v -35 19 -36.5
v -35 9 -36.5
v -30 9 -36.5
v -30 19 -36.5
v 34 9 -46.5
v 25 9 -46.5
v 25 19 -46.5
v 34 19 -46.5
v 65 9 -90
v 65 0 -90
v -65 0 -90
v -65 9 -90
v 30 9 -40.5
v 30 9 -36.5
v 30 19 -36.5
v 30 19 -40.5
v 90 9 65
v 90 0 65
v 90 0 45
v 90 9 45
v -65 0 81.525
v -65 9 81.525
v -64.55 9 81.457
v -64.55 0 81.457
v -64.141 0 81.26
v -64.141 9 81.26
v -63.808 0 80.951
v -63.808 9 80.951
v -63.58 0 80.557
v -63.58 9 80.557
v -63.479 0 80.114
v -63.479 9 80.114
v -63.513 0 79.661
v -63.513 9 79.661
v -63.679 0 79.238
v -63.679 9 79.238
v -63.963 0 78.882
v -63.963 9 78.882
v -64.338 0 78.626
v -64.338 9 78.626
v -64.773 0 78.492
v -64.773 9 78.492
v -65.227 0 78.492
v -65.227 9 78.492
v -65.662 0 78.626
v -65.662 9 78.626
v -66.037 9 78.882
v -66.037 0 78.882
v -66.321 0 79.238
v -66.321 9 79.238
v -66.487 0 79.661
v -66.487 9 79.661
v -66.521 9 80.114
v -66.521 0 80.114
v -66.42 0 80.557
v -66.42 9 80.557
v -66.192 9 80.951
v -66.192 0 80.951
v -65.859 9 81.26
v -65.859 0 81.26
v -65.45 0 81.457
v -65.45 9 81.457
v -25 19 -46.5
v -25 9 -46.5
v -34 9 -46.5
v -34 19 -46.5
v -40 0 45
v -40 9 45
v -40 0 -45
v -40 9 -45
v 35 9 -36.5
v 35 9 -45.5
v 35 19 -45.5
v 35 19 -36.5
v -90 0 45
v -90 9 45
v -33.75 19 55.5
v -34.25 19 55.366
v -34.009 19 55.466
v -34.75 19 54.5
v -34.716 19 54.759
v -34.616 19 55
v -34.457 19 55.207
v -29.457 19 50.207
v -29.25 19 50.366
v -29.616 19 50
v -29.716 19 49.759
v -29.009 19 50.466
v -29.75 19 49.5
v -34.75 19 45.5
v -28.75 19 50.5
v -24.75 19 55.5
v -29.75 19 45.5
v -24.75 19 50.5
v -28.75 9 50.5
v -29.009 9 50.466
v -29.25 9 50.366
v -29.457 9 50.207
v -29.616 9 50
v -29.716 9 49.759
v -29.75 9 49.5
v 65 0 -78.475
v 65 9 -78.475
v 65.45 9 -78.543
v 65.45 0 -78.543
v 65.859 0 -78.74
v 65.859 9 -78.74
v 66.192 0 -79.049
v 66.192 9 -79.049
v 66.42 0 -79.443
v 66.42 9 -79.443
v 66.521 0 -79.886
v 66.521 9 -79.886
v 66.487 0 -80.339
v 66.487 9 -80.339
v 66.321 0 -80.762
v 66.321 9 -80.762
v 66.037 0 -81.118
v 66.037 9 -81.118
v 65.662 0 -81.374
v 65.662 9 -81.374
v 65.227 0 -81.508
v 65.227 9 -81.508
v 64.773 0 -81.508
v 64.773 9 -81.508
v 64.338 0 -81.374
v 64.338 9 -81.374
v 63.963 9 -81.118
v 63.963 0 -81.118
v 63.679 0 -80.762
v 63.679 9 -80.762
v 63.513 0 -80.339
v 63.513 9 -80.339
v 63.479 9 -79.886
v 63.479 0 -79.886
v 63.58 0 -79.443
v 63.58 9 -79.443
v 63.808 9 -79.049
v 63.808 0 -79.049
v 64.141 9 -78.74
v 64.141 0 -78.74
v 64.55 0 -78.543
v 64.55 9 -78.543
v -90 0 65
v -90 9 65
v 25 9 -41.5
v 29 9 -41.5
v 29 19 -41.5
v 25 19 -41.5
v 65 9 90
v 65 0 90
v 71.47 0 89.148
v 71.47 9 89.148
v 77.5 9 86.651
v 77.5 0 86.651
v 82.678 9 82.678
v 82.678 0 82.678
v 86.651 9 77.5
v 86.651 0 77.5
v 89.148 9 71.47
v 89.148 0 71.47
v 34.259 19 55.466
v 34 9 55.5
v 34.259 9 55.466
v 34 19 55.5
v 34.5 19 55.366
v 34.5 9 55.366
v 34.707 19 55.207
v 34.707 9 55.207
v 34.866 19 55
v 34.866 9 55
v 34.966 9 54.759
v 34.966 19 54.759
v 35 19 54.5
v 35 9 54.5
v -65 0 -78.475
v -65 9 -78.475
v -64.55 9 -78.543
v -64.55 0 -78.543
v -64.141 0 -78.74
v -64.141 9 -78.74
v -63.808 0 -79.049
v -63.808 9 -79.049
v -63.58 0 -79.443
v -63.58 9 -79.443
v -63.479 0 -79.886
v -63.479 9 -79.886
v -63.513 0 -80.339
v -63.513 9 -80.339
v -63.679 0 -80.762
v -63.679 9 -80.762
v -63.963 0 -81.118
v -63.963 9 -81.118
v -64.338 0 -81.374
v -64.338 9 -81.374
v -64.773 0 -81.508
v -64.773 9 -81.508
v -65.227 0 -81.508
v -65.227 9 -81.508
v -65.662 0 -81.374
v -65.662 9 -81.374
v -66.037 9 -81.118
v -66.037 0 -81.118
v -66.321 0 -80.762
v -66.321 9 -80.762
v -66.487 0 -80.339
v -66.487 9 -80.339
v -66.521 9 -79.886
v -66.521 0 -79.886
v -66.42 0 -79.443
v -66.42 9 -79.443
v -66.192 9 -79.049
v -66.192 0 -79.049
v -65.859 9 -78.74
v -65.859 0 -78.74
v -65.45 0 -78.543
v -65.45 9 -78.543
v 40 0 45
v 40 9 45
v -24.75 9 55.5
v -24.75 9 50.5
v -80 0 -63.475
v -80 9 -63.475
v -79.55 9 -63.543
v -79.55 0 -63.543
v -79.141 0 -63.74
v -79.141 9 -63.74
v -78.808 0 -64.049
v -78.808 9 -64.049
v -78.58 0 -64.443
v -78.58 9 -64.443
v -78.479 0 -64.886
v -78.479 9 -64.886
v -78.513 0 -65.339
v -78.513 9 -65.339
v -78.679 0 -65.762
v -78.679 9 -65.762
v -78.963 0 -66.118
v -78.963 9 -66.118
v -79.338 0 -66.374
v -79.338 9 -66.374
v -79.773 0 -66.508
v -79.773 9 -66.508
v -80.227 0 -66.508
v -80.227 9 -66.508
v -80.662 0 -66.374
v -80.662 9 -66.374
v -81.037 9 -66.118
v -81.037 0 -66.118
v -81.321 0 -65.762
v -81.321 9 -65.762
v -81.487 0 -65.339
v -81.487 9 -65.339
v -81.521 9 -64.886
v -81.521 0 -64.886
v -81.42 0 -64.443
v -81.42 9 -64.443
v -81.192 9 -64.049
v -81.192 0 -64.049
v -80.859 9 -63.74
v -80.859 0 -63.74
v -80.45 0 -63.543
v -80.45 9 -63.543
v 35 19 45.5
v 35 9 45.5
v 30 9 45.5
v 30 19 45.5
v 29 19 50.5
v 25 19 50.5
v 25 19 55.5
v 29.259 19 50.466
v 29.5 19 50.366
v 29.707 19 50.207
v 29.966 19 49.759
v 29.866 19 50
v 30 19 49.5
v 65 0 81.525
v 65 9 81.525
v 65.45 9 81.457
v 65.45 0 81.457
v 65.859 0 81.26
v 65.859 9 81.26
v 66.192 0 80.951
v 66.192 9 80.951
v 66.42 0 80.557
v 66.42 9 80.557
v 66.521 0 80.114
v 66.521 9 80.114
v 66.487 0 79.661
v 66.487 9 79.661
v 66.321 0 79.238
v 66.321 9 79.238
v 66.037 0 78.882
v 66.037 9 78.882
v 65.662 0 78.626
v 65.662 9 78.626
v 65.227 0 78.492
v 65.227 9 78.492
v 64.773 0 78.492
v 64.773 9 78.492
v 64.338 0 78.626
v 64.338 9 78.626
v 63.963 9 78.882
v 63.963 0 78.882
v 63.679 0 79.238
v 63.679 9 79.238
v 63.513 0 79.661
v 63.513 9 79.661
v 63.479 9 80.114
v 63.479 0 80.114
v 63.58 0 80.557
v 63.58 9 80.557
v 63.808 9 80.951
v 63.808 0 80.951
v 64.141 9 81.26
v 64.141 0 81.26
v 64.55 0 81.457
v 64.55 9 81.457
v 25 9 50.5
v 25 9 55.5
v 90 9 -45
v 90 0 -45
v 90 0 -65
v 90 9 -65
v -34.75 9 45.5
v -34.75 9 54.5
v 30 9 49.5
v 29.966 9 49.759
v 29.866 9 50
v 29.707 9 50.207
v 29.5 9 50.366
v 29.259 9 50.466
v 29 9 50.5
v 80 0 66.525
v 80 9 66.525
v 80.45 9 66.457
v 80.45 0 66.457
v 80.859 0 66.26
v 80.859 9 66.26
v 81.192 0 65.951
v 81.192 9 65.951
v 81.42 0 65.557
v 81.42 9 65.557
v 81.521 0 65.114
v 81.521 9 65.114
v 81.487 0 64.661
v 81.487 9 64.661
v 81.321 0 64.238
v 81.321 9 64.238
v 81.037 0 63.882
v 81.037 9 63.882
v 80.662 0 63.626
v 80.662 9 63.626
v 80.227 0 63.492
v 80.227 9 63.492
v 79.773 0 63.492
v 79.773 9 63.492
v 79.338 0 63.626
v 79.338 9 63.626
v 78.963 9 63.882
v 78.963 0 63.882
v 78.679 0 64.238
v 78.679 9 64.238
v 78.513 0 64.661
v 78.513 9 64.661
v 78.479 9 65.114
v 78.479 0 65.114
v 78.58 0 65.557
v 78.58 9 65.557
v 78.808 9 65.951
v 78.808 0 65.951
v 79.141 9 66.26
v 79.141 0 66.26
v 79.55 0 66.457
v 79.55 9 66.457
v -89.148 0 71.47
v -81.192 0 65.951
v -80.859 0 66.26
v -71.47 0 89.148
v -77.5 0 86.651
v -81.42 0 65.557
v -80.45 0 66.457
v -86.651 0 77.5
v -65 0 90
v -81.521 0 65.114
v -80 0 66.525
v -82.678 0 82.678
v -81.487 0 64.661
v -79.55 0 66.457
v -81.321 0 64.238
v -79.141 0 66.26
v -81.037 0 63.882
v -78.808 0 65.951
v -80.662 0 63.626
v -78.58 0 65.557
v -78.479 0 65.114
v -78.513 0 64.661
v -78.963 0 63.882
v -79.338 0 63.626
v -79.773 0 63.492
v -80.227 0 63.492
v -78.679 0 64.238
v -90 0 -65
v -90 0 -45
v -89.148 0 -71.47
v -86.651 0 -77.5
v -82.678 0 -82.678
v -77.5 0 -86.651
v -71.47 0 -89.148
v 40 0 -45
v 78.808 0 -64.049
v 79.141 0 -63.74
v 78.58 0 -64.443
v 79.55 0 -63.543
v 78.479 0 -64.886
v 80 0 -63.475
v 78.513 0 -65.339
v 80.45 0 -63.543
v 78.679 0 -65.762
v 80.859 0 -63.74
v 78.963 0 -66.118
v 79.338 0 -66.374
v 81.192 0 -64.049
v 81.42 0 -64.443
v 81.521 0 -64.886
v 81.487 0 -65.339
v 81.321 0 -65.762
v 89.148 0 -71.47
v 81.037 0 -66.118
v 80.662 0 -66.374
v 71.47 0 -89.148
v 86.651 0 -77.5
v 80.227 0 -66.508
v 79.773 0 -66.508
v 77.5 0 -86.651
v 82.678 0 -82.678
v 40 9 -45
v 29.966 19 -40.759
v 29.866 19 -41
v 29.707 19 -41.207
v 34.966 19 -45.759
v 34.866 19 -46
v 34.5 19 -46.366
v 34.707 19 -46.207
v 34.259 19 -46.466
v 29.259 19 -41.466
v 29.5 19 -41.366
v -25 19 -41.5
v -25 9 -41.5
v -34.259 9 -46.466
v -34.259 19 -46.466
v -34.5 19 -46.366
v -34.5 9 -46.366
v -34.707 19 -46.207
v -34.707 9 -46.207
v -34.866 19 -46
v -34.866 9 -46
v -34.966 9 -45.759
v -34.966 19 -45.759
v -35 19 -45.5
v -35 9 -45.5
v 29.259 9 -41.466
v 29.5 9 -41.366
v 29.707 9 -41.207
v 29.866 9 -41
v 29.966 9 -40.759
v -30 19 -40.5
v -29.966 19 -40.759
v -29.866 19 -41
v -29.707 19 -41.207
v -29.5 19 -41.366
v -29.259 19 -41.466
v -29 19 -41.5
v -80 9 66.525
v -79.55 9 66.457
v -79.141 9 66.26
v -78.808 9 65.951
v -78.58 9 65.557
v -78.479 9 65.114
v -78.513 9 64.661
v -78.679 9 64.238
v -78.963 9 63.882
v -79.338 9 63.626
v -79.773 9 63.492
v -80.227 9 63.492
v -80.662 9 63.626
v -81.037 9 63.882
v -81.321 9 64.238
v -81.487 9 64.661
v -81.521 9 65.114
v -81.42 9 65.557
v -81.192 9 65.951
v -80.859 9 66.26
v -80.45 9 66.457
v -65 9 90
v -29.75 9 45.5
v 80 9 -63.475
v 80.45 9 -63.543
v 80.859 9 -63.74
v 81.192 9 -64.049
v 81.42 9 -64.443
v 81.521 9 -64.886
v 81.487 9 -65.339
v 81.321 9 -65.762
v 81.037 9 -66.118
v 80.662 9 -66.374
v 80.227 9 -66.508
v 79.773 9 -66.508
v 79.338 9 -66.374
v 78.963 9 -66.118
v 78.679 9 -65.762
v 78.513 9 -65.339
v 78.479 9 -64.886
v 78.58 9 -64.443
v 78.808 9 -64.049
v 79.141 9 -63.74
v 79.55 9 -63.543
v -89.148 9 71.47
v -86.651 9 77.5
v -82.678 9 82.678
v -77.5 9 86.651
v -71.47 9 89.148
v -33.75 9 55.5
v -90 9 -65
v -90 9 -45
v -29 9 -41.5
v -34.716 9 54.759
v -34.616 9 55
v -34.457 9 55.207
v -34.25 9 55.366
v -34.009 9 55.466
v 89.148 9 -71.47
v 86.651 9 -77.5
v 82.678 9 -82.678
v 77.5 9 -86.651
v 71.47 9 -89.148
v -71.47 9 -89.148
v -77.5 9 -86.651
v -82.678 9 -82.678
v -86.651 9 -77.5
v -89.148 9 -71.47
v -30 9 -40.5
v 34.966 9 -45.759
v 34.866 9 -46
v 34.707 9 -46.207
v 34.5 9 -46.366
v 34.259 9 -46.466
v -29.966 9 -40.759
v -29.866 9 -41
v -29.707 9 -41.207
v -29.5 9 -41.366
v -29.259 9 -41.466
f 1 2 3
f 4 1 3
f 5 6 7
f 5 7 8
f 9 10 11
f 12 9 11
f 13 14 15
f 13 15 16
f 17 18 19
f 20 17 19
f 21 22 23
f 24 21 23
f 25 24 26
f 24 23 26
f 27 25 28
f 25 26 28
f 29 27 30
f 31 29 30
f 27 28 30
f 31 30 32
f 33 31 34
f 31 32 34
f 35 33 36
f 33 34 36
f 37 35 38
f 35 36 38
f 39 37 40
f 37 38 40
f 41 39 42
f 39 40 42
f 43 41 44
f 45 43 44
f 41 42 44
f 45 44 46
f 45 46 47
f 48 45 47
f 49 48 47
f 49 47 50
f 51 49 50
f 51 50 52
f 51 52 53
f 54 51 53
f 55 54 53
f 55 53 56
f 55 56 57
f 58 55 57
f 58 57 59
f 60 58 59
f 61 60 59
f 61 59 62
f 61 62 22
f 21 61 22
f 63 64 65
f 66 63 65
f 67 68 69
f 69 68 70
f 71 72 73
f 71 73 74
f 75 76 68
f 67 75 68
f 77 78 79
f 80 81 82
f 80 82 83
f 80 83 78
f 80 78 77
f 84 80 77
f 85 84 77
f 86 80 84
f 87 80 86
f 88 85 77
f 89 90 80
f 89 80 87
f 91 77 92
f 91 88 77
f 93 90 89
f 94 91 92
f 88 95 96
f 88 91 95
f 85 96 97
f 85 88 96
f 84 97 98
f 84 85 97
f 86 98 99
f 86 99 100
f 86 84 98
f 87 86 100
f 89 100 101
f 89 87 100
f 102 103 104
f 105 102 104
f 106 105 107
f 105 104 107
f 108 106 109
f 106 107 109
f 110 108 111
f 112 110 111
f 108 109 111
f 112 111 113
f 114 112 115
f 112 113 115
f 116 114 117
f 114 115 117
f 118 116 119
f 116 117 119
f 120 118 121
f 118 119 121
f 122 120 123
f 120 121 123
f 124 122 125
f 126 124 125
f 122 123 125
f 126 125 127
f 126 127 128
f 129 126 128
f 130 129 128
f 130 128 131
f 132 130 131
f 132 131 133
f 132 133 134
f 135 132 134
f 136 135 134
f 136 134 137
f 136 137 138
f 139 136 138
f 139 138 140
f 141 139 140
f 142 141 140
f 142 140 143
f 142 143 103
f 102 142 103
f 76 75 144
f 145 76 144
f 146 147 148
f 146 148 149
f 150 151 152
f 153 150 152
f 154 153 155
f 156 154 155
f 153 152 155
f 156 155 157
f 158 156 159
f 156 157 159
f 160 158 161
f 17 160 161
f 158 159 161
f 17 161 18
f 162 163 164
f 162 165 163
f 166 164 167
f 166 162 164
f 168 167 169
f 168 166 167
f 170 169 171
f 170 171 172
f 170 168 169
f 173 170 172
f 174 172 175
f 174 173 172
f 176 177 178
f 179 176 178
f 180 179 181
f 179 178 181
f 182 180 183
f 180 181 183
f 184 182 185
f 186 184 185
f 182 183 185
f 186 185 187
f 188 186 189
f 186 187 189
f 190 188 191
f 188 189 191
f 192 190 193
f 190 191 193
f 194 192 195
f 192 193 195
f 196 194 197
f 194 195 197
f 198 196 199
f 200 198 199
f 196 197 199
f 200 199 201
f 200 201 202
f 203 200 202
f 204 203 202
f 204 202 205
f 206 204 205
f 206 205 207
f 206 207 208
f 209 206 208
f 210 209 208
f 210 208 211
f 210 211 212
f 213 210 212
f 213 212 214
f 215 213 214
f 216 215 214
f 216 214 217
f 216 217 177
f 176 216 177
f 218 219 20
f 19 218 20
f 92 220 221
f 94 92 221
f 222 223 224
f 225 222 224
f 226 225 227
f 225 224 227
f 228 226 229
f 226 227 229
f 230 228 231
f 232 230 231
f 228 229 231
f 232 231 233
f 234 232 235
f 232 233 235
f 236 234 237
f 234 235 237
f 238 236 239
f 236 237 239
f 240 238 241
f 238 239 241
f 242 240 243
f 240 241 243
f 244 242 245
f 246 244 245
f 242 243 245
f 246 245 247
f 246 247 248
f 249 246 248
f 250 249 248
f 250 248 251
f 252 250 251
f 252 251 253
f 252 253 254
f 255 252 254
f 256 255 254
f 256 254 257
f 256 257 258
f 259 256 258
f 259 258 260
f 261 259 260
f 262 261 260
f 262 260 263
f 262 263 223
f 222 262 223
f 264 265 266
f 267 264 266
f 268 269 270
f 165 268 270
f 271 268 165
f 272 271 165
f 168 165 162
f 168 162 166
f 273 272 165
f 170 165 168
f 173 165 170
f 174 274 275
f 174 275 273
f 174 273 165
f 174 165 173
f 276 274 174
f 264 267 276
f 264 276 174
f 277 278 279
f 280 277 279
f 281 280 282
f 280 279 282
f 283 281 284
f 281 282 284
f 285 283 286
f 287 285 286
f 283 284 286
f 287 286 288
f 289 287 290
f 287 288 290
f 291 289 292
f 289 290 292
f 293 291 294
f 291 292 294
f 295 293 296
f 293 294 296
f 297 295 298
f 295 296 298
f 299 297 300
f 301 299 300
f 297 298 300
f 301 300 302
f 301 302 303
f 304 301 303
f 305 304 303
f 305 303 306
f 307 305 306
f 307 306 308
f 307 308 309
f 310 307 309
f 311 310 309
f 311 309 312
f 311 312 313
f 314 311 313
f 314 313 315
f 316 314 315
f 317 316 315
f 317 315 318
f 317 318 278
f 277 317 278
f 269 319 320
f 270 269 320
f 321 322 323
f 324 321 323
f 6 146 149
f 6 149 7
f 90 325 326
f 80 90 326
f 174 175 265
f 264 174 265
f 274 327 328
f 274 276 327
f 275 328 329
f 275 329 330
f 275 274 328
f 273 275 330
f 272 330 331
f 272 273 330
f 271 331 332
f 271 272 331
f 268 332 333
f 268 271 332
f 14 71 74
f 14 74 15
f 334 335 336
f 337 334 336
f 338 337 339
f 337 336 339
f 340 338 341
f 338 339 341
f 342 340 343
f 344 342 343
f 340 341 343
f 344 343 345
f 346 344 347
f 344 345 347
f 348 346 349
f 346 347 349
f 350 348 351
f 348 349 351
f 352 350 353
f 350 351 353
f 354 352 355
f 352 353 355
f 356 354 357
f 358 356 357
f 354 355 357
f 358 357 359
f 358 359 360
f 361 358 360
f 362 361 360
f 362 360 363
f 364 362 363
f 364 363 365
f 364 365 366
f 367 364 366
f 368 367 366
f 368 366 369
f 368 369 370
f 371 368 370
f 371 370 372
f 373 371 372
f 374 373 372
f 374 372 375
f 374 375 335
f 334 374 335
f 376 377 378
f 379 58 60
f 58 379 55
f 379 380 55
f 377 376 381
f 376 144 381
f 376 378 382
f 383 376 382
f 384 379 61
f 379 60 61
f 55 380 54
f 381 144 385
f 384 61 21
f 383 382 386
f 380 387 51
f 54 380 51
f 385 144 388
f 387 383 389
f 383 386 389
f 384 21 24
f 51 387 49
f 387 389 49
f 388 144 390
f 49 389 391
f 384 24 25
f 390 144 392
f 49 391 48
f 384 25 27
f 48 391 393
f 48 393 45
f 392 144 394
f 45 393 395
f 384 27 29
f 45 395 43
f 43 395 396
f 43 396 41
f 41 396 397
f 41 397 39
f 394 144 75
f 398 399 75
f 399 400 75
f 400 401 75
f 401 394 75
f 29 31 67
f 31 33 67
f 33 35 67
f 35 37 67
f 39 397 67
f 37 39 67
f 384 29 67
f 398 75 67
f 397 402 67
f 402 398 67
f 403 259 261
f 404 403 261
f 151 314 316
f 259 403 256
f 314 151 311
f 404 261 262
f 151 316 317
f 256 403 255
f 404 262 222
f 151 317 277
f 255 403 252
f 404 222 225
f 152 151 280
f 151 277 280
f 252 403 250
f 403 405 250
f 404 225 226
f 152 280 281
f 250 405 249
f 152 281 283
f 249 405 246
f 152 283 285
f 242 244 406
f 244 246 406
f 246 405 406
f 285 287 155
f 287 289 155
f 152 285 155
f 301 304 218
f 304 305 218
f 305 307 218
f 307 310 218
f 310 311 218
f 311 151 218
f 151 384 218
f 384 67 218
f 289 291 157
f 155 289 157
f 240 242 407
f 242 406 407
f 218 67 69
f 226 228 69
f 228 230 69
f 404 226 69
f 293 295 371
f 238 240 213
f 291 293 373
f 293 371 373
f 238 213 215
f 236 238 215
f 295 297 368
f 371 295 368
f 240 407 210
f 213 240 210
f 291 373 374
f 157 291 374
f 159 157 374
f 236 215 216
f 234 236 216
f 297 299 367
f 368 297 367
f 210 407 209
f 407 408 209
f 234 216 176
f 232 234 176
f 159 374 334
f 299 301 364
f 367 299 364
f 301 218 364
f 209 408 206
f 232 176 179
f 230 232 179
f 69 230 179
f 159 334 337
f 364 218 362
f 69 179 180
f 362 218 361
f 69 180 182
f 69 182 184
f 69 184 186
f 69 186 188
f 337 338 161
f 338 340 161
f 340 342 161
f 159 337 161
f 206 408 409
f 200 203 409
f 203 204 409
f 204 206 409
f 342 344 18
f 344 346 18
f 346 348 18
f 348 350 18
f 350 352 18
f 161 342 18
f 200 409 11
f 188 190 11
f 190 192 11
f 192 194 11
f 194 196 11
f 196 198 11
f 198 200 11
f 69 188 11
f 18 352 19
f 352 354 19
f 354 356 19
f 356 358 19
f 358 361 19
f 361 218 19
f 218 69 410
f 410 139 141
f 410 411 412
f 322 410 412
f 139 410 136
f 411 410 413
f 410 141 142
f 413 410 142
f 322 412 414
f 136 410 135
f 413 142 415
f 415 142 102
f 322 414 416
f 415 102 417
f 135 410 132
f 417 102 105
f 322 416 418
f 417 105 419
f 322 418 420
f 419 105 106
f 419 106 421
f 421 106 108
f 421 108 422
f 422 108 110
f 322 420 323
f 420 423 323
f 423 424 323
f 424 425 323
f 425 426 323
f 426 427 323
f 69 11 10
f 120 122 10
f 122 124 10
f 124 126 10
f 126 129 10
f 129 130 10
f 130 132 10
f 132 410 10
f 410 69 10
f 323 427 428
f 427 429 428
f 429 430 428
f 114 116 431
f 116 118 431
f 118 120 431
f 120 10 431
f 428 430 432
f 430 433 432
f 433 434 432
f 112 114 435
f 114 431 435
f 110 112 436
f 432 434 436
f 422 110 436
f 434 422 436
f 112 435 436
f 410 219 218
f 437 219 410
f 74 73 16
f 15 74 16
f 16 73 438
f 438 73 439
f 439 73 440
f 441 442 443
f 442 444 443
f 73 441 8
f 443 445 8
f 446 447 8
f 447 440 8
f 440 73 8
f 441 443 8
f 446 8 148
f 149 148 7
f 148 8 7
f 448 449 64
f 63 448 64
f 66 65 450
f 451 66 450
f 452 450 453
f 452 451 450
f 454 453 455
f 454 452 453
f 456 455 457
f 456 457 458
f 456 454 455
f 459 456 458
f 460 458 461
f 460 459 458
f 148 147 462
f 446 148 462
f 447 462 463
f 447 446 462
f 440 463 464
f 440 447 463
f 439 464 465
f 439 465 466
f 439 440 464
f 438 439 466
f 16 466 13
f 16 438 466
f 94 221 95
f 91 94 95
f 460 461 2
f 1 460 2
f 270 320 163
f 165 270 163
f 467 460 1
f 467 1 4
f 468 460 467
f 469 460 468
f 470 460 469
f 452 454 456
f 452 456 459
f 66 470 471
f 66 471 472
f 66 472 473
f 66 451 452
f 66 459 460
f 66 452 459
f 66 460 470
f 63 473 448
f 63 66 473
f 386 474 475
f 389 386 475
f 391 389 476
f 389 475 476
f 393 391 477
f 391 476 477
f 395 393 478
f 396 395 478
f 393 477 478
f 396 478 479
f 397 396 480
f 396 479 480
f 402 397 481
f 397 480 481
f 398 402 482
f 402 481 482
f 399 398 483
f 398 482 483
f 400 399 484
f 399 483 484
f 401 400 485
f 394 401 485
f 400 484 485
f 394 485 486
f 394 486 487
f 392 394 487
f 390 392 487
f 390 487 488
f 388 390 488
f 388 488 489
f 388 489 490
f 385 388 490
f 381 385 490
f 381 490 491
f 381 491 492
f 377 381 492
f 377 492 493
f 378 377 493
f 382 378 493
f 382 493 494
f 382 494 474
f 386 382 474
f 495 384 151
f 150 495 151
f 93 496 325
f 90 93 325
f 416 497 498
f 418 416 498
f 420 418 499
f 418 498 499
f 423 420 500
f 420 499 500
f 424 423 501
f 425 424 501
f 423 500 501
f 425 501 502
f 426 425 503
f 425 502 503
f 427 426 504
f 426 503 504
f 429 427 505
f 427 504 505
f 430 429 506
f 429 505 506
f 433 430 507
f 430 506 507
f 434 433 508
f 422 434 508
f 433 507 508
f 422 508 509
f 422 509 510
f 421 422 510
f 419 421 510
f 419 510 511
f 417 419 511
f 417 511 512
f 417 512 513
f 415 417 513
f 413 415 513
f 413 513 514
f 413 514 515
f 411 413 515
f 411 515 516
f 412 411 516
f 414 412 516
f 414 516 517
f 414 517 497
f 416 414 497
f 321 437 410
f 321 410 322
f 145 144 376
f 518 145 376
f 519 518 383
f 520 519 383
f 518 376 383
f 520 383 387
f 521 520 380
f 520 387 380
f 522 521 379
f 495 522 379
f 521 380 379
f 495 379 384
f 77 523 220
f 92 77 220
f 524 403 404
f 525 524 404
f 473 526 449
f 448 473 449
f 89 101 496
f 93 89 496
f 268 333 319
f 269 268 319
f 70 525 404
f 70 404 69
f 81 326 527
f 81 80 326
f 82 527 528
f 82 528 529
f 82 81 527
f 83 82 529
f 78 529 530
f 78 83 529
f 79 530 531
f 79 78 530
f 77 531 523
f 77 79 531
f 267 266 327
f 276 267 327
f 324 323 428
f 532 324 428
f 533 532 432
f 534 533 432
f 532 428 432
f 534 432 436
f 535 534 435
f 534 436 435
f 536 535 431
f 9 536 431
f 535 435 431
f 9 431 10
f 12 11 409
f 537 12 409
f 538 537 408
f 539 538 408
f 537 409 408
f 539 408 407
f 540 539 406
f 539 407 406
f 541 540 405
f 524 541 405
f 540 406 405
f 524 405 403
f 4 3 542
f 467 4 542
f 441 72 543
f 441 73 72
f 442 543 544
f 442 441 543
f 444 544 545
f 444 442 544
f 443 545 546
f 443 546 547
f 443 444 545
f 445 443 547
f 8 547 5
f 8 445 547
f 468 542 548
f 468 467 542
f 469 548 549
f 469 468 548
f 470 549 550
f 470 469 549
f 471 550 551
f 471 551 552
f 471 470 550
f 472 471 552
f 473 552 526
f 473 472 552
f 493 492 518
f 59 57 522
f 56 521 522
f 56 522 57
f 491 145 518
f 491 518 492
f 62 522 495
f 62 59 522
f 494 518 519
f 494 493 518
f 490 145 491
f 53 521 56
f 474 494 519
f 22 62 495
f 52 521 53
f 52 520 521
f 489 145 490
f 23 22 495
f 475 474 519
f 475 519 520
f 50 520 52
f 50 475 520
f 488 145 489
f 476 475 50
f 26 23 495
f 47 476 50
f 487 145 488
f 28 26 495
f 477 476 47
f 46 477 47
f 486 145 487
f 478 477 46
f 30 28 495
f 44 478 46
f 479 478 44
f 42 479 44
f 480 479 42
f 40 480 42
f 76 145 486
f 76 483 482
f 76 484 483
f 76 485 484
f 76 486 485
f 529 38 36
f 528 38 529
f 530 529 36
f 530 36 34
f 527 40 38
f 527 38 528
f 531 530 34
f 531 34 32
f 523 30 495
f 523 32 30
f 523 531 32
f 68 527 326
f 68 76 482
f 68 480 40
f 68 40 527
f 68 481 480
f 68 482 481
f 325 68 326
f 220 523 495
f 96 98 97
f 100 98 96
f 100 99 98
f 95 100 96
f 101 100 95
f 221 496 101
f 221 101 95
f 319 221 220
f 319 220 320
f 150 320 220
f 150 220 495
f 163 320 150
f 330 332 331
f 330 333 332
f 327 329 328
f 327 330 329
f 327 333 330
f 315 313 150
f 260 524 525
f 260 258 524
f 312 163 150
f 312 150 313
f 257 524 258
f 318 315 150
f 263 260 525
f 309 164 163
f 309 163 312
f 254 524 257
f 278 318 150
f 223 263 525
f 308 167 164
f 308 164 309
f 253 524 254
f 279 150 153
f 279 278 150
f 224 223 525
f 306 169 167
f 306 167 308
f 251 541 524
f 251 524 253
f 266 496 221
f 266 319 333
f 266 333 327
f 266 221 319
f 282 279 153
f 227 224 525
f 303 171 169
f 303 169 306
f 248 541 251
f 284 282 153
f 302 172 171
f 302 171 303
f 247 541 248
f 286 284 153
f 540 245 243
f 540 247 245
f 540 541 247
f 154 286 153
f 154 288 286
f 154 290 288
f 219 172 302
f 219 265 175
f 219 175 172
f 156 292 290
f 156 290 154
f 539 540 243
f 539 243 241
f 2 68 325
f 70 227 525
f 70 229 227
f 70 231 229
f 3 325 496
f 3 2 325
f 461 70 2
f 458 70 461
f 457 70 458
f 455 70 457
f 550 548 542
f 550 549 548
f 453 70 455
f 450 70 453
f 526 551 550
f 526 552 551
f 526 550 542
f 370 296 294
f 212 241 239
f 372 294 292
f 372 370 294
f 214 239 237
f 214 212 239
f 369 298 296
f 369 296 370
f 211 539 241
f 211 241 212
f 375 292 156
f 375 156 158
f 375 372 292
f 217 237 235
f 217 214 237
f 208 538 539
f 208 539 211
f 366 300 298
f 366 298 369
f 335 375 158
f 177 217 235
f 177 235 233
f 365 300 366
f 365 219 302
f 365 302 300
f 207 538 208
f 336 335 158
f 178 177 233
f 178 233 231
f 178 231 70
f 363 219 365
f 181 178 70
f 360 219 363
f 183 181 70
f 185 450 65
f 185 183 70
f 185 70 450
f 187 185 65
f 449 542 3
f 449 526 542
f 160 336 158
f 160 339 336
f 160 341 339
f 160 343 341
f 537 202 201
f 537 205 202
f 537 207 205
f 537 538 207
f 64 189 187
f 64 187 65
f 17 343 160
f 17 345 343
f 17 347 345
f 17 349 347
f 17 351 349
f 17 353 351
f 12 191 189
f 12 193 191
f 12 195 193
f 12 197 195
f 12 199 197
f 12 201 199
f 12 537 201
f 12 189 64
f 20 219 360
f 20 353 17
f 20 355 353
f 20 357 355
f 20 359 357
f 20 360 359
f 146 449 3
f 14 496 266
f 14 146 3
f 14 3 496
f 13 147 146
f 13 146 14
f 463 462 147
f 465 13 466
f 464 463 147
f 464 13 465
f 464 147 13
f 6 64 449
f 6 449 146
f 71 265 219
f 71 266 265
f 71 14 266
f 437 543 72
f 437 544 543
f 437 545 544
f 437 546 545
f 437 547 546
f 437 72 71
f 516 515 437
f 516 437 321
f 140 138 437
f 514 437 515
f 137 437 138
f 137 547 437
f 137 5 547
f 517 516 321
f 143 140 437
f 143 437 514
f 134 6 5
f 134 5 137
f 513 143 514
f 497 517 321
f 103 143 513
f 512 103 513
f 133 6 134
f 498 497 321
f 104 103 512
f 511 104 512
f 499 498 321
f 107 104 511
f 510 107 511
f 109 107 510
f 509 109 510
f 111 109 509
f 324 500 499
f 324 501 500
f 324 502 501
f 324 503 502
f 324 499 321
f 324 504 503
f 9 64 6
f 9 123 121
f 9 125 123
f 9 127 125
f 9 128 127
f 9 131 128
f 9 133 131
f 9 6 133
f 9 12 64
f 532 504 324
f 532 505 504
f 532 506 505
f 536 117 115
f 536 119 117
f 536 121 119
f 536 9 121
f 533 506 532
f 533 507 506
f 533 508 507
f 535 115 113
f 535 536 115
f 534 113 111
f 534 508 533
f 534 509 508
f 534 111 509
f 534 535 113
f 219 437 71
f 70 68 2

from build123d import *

# Parameters (mm, degrees)
PLATE_DEPTH               = 9
SKETCH3_R                 = 1.525
HEX_HOLES_DEPTH           = 128.597021909
RASPBERRY_PI_HOLDER_DEPTH = 10
FILLET1_R                 = 1
SKETCH5_W                 = 50
SKETCH5_H                 = 90
CUT_EXTRUDE1_DEPTH        = 128.671453348


with BuildPart() as part:
    # Sketch1 → Plate (new body)
    with BuildSketch(Plane(origin=(0, 0, 0), x_dir=(1, 0, 0), z_dir=(0, 1, 0))):
        with BuildLine():
            Line((-65, -90), (65, -90))
            ThreePointArc((65, -90), (82.67766953, -82.67766953), (90, -65))
            Line((90, -65), (90, 65))
            ThreePointArc((90, 65), (82.67766953, 82.67766953), (65, 90))
            Line((65, 90), (-65, 90))
            ThreePointArc((-65, 90), (-82.67766953, 82.67766953), (-90, 65))
            Line((-90, 65), (-90, -65))
            ThreePointArc((-90, -65), (-82.67766953, -82.67766953), (-65, -90))
        make_face()
    extrude(amount=PLATE_DEPTH)

    # Sketch3 → Hex Holes (cut, through all)
    with BuildSketch(Plane(origin=(0, 9, 0), x_dir=(1, 0, 0), z_dir=(0, 1, 0))):
        with Locations(Location((-65, 80, 0), (0, 0, 270))):
            Circle(SKETCH3_R)
        with Locations(Location((-80, 65, 0), (0, 0, 270))):
            Circle(SKETCH3_R)
        with Locations(Location((80, 65, 0), (0, 0, 270))):
            Circle(SKETCH3_R)
        with Locations(Location((80, -65, 0), (0, 0, 270))):
            Circle(SKETCH3_R)
        with Locations(Location((65, 80, 0), (0, 0, 270))):
            Circle(SKETCH3_R)
        with Locations(Location((65, -80, 0), (0, 0, 270))):
            Circle(SKETCH3_R)
        with Locations(Location((-65, -80, 0), (0, 0, 270))):
            Circle(SKETCH3_R)
        with Locations(Location((-80, -65, 0), (0, 0, 270))):
            Circle(SKETCH3_R)
    extrude(amount=-HEX_HOLES_DEPTH, mode=Mode.SUBTRACT)

    # Sketch4 → Raspberry Pi Holder (add)
    with BuildSketch(Plane(origin=(0, 9, 0), x_dir=(1, 0, 0), z_dir=(0, 1, 0))):
        Polygon((-30, 36.5), (-30, 41.5), (-25, 41.5), (-25, 46.5), (-35, 46.5), (-35, 36.5), align=None)
        Polygon((25, 46.5), (35, 46.5), (35, 36.5), (30, 36.5), (30, 41.5), (25, 41.5), align=None)
        Polygon((-34.75, -45.5), (-34.75, -55.5), (-24.75, -55.5), (-24.75, -50.5), (-29.75, -50.5), (-29.75, -45.5), align=None)
        Polygon((25, -50.5), (25, -55.5), (35, -55.5), (35, -45.5), (30, -45.5), (30, -50.5), align=None)
    extrude(amount=RASPBERRY_PI_HOLDER_DEPTH)

    # Fillet1
    fillet1_edges = [part.edges().sort_by_distance(p)[0] for p in [
        (-30, 14, -41.5),
        (-35, 14, -46.5),
        (30, 14, -41.5),
        (35, 14, -46.5),
        (-34.75, 14, 55.5),
        (-29.75, 14, 50.5),
        (35, 14, 55.5),
        (30, 14, 50.5),
    ]]
    fillet(fillet1_edges, radius=FILLET1_R)

    # Sketch5 → Cut-Extrude1 (cut, through all)
    with BuildSketch(Plane(origin=(0, 9, 0), x_dir=(1, 0, 0), z_dir=(0, 1, 0))):
        with Locations((-65, 0)):
            Rectangle(SKETCH5_W, SKETCH5_H)
        with Locations((65, 0)):
            Rectangle(SKETCH5_W, SKETCH5_H)
    extrude(amount=-CUT_EXTRUDE1_DEPTH, mode=Mode.SUBTRACT)


solid = part.part
